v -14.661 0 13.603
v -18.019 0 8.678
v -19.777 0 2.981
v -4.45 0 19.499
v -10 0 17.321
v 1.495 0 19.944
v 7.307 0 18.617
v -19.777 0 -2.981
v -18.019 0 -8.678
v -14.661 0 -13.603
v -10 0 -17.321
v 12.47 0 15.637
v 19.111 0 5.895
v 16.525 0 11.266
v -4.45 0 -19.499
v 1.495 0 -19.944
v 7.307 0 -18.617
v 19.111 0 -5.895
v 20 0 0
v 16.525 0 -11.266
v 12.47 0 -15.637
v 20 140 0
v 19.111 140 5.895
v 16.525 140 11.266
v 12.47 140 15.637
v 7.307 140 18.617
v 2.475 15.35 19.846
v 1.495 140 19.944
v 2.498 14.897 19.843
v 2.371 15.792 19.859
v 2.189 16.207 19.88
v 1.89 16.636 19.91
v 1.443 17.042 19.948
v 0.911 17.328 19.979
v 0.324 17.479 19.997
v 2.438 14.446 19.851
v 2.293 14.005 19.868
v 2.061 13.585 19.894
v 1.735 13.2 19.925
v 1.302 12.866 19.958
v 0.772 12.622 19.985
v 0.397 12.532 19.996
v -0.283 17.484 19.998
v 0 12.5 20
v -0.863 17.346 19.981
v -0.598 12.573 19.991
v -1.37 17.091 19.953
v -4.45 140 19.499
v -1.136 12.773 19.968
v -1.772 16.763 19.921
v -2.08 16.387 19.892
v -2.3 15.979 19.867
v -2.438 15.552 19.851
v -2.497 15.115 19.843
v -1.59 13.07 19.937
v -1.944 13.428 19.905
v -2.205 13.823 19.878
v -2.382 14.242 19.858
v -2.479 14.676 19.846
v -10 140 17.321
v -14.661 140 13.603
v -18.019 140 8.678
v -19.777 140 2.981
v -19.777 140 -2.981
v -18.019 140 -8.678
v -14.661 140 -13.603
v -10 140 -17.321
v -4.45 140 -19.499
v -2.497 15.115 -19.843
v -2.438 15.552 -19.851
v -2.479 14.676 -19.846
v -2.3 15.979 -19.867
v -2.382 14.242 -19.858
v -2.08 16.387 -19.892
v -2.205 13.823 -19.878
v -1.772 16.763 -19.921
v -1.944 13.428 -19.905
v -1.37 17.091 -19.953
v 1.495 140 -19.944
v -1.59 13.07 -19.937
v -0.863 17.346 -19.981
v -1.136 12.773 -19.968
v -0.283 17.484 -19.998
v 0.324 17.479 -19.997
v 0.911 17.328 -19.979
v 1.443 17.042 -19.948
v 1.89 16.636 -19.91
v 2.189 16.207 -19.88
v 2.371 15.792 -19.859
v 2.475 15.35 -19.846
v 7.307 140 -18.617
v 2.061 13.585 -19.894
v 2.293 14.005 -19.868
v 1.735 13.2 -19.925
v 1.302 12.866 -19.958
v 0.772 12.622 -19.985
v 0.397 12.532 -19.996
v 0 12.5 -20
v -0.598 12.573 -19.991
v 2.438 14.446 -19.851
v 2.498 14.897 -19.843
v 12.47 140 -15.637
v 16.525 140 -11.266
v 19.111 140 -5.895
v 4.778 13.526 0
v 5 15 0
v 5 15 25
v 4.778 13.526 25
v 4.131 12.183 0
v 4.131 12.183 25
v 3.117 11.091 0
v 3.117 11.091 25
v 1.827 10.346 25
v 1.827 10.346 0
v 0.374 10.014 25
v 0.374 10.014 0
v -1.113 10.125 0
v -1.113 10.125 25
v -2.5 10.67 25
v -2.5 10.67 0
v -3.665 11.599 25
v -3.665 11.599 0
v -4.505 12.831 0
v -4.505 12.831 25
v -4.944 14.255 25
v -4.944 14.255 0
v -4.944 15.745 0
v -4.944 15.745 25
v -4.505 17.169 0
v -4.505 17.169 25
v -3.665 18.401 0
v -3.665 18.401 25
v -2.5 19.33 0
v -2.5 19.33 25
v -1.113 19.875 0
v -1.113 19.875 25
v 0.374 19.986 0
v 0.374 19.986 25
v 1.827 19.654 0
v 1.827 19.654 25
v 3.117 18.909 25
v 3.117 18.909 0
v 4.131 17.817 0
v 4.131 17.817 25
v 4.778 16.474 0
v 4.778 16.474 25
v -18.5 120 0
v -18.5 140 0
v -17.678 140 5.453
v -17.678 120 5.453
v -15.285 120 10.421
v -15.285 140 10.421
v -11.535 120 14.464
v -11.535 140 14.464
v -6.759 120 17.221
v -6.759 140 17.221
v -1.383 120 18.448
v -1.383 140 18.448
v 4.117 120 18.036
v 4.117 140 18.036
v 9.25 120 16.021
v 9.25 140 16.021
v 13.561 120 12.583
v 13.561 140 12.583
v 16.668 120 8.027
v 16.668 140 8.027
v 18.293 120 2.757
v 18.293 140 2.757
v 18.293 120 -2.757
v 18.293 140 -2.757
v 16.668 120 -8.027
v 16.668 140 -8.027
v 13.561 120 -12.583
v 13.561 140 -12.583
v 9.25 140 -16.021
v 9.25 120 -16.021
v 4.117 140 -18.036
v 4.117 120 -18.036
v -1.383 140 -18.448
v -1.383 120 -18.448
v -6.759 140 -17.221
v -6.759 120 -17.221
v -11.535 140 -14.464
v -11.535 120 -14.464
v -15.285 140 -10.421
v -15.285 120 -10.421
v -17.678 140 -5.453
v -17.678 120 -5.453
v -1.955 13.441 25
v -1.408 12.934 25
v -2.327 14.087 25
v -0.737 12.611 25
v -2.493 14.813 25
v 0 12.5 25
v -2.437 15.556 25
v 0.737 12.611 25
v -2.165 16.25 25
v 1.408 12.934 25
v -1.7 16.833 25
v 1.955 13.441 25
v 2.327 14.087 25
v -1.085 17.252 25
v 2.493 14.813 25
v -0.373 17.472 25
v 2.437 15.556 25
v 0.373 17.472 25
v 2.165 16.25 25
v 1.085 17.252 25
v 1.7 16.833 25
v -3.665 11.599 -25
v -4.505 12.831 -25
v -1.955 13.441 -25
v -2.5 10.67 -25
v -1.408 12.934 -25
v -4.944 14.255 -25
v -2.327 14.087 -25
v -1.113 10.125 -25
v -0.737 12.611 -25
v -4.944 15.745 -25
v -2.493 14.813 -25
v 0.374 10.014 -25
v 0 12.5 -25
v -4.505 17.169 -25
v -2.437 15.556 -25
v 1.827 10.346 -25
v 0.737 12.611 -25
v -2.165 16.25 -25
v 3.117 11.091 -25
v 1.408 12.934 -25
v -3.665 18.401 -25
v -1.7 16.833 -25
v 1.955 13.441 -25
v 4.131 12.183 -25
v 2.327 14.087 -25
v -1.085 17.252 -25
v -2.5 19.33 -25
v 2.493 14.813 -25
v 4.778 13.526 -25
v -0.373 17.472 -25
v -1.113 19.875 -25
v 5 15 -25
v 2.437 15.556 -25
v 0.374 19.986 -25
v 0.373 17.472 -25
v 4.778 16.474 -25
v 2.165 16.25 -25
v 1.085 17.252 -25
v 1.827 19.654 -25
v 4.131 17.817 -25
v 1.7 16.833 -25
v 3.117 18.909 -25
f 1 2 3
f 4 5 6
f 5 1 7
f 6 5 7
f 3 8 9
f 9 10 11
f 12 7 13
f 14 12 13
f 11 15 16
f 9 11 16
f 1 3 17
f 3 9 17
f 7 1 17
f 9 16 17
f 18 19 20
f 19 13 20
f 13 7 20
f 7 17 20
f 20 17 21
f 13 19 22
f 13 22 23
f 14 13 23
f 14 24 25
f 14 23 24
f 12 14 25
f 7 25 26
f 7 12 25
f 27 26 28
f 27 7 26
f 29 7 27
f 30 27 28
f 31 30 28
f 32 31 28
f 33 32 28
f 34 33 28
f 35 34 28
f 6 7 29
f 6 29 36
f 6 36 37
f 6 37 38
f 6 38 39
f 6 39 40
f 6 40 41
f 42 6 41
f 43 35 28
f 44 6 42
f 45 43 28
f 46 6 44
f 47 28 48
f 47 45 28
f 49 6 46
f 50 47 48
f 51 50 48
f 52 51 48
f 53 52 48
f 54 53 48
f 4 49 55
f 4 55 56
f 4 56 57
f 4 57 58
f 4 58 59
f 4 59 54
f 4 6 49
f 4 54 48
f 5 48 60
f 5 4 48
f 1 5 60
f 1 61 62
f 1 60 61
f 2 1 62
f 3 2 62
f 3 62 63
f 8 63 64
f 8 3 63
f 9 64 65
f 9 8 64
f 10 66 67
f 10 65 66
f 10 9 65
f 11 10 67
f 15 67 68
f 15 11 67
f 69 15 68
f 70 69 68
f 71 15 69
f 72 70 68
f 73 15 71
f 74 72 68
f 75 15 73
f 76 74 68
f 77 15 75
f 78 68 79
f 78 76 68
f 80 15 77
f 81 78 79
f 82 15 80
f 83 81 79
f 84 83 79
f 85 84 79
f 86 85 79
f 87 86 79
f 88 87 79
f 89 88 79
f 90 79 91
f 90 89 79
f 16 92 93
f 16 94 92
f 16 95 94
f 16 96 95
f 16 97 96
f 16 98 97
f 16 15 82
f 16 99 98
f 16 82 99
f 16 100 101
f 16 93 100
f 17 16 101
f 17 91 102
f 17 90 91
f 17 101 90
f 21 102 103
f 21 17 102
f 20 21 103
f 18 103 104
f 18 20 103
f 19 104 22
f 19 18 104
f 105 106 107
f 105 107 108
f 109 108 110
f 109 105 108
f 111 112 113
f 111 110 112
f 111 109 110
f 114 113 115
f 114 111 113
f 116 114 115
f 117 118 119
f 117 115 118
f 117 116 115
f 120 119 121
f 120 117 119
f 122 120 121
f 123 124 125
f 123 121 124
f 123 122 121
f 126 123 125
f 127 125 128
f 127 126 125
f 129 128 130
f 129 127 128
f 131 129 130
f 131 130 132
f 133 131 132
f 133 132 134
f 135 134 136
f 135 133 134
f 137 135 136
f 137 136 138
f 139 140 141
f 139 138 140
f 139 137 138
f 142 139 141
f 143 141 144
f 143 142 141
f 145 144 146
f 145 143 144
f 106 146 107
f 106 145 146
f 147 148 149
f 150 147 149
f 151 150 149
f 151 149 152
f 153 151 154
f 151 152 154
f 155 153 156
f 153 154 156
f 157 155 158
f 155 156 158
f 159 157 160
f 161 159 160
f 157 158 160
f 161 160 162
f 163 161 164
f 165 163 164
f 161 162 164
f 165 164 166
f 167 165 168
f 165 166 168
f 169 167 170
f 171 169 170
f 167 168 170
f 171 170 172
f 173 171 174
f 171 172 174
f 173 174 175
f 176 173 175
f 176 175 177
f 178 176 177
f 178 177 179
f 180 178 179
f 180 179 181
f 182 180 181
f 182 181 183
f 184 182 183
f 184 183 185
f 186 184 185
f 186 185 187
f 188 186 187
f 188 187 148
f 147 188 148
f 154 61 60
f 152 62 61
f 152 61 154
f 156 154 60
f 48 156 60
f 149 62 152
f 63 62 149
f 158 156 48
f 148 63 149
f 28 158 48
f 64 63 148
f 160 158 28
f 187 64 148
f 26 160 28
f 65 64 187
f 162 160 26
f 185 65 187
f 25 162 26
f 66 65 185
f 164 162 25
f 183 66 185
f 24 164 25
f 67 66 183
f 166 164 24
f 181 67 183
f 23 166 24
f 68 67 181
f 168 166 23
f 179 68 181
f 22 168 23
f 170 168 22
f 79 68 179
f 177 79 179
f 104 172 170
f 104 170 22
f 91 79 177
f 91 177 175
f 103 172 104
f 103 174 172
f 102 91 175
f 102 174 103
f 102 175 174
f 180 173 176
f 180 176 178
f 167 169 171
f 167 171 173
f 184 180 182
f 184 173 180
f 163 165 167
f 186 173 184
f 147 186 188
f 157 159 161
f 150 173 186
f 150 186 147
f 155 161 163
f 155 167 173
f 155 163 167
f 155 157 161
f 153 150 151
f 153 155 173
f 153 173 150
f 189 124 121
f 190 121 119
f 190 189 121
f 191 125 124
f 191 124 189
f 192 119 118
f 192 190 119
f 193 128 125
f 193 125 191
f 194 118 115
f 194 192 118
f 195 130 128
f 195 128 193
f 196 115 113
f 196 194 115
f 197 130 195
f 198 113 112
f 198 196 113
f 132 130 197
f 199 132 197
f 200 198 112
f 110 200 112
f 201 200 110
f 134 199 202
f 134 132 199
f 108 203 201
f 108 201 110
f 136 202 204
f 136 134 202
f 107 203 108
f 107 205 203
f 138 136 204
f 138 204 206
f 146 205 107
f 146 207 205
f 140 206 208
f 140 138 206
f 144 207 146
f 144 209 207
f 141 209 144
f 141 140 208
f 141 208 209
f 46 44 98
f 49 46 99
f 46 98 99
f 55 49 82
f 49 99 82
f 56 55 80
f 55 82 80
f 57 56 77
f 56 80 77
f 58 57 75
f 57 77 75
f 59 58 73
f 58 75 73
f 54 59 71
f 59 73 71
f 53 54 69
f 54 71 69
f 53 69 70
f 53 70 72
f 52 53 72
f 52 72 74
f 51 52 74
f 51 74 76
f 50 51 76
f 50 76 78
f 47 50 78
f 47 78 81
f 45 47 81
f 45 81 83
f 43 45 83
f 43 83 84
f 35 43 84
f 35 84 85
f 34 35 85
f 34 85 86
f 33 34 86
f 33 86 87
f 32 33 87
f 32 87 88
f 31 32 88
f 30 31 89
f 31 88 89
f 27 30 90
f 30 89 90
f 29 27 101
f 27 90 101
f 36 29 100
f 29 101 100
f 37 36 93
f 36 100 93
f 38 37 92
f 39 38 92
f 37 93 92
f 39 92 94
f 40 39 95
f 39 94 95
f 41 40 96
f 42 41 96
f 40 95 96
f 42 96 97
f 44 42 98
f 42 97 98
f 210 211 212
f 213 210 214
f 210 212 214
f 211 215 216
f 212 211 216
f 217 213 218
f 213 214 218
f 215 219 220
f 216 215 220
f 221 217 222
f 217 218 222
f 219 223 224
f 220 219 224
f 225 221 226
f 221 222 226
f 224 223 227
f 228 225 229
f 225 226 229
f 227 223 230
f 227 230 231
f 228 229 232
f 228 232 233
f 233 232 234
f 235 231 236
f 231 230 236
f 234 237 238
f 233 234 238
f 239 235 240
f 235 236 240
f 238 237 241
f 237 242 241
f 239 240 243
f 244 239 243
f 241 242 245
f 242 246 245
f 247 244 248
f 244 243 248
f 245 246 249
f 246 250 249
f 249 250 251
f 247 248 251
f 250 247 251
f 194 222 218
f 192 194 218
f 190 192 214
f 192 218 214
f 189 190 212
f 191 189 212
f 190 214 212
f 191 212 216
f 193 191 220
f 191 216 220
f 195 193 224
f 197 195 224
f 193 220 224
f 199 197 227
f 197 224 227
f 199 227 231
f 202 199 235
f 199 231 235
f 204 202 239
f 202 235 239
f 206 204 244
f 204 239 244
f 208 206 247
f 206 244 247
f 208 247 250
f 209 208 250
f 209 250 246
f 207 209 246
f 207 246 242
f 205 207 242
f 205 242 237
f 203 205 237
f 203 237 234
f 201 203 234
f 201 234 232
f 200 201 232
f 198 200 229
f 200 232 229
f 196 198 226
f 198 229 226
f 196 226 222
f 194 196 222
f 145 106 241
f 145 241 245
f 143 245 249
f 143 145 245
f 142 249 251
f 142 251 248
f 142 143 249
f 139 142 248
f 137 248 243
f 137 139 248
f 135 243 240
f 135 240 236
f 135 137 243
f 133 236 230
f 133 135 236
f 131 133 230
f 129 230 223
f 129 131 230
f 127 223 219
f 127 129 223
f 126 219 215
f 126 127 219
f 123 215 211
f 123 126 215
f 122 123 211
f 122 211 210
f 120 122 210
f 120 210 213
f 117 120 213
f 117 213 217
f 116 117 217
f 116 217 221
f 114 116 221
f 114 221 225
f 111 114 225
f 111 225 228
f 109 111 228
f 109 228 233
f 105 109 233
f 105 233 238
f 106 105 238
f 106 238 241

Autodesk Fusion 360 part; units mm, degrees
sketch "Sketch1" plane through (0, 0, 0) normal (0, 1, 0) x (1, 0, 0)
  circle A0 centre (0, 0) radius 10
  dimension "d1" = 20
sketch "Sketch2" plane through (0, 0, 0) normal (0, 1, 0) x (1, 0, 0)
sketch "Sketch3" plane through (0, 0, 0) normal (0, 0, 1) x (1, 0, 0)
  circle A0 centre (0, 15) radius 5
  dimension "d10" = 10
sketch "Sketch4" plane through (0, 0, 0) normal (0, 1, 0) x (1, 0, 0)
  circle A0 centre (0, 0) radius 20
  dimension "d20" = 40
extrude "Extrude4" add sketch "Sketch4" along normal blind 140 makes body 1
sketch "Sketch5" plane through (0, 140, 0) normal (0, 1, 0) x (-1, 0, 0)
  circle A0 centre (0, 0) radius 20
  circle A1 centre (0, 0) radius 18.5
  dimension "d23" = 37
extrude "Extrude5" cut sketch "Sketch5" against normal blind 20 contours A1 bodies 1
sketch "Sketch6" plane through (0, 0, 0) normal (0, 0, 1) x (1, 0, 0)
  circle A0 centre (0, 15) radius 5
  dimension "d26" = 10
extrude "Extrude6" add sketch "Sketch6" along normal blind 25 and the other way blind 25 separate body makes body 2
sketch "Sketch7" plane through (0, 0, 25) normal (0, 0, 1) x (1, 0, 0)
  circle A0 centre (0, 15) radius 5
hole "Hole3" at (0, 15, 25) direction (0, 0, -1) diameter 5 depth 50 tip angle 118 bodies 1 2
